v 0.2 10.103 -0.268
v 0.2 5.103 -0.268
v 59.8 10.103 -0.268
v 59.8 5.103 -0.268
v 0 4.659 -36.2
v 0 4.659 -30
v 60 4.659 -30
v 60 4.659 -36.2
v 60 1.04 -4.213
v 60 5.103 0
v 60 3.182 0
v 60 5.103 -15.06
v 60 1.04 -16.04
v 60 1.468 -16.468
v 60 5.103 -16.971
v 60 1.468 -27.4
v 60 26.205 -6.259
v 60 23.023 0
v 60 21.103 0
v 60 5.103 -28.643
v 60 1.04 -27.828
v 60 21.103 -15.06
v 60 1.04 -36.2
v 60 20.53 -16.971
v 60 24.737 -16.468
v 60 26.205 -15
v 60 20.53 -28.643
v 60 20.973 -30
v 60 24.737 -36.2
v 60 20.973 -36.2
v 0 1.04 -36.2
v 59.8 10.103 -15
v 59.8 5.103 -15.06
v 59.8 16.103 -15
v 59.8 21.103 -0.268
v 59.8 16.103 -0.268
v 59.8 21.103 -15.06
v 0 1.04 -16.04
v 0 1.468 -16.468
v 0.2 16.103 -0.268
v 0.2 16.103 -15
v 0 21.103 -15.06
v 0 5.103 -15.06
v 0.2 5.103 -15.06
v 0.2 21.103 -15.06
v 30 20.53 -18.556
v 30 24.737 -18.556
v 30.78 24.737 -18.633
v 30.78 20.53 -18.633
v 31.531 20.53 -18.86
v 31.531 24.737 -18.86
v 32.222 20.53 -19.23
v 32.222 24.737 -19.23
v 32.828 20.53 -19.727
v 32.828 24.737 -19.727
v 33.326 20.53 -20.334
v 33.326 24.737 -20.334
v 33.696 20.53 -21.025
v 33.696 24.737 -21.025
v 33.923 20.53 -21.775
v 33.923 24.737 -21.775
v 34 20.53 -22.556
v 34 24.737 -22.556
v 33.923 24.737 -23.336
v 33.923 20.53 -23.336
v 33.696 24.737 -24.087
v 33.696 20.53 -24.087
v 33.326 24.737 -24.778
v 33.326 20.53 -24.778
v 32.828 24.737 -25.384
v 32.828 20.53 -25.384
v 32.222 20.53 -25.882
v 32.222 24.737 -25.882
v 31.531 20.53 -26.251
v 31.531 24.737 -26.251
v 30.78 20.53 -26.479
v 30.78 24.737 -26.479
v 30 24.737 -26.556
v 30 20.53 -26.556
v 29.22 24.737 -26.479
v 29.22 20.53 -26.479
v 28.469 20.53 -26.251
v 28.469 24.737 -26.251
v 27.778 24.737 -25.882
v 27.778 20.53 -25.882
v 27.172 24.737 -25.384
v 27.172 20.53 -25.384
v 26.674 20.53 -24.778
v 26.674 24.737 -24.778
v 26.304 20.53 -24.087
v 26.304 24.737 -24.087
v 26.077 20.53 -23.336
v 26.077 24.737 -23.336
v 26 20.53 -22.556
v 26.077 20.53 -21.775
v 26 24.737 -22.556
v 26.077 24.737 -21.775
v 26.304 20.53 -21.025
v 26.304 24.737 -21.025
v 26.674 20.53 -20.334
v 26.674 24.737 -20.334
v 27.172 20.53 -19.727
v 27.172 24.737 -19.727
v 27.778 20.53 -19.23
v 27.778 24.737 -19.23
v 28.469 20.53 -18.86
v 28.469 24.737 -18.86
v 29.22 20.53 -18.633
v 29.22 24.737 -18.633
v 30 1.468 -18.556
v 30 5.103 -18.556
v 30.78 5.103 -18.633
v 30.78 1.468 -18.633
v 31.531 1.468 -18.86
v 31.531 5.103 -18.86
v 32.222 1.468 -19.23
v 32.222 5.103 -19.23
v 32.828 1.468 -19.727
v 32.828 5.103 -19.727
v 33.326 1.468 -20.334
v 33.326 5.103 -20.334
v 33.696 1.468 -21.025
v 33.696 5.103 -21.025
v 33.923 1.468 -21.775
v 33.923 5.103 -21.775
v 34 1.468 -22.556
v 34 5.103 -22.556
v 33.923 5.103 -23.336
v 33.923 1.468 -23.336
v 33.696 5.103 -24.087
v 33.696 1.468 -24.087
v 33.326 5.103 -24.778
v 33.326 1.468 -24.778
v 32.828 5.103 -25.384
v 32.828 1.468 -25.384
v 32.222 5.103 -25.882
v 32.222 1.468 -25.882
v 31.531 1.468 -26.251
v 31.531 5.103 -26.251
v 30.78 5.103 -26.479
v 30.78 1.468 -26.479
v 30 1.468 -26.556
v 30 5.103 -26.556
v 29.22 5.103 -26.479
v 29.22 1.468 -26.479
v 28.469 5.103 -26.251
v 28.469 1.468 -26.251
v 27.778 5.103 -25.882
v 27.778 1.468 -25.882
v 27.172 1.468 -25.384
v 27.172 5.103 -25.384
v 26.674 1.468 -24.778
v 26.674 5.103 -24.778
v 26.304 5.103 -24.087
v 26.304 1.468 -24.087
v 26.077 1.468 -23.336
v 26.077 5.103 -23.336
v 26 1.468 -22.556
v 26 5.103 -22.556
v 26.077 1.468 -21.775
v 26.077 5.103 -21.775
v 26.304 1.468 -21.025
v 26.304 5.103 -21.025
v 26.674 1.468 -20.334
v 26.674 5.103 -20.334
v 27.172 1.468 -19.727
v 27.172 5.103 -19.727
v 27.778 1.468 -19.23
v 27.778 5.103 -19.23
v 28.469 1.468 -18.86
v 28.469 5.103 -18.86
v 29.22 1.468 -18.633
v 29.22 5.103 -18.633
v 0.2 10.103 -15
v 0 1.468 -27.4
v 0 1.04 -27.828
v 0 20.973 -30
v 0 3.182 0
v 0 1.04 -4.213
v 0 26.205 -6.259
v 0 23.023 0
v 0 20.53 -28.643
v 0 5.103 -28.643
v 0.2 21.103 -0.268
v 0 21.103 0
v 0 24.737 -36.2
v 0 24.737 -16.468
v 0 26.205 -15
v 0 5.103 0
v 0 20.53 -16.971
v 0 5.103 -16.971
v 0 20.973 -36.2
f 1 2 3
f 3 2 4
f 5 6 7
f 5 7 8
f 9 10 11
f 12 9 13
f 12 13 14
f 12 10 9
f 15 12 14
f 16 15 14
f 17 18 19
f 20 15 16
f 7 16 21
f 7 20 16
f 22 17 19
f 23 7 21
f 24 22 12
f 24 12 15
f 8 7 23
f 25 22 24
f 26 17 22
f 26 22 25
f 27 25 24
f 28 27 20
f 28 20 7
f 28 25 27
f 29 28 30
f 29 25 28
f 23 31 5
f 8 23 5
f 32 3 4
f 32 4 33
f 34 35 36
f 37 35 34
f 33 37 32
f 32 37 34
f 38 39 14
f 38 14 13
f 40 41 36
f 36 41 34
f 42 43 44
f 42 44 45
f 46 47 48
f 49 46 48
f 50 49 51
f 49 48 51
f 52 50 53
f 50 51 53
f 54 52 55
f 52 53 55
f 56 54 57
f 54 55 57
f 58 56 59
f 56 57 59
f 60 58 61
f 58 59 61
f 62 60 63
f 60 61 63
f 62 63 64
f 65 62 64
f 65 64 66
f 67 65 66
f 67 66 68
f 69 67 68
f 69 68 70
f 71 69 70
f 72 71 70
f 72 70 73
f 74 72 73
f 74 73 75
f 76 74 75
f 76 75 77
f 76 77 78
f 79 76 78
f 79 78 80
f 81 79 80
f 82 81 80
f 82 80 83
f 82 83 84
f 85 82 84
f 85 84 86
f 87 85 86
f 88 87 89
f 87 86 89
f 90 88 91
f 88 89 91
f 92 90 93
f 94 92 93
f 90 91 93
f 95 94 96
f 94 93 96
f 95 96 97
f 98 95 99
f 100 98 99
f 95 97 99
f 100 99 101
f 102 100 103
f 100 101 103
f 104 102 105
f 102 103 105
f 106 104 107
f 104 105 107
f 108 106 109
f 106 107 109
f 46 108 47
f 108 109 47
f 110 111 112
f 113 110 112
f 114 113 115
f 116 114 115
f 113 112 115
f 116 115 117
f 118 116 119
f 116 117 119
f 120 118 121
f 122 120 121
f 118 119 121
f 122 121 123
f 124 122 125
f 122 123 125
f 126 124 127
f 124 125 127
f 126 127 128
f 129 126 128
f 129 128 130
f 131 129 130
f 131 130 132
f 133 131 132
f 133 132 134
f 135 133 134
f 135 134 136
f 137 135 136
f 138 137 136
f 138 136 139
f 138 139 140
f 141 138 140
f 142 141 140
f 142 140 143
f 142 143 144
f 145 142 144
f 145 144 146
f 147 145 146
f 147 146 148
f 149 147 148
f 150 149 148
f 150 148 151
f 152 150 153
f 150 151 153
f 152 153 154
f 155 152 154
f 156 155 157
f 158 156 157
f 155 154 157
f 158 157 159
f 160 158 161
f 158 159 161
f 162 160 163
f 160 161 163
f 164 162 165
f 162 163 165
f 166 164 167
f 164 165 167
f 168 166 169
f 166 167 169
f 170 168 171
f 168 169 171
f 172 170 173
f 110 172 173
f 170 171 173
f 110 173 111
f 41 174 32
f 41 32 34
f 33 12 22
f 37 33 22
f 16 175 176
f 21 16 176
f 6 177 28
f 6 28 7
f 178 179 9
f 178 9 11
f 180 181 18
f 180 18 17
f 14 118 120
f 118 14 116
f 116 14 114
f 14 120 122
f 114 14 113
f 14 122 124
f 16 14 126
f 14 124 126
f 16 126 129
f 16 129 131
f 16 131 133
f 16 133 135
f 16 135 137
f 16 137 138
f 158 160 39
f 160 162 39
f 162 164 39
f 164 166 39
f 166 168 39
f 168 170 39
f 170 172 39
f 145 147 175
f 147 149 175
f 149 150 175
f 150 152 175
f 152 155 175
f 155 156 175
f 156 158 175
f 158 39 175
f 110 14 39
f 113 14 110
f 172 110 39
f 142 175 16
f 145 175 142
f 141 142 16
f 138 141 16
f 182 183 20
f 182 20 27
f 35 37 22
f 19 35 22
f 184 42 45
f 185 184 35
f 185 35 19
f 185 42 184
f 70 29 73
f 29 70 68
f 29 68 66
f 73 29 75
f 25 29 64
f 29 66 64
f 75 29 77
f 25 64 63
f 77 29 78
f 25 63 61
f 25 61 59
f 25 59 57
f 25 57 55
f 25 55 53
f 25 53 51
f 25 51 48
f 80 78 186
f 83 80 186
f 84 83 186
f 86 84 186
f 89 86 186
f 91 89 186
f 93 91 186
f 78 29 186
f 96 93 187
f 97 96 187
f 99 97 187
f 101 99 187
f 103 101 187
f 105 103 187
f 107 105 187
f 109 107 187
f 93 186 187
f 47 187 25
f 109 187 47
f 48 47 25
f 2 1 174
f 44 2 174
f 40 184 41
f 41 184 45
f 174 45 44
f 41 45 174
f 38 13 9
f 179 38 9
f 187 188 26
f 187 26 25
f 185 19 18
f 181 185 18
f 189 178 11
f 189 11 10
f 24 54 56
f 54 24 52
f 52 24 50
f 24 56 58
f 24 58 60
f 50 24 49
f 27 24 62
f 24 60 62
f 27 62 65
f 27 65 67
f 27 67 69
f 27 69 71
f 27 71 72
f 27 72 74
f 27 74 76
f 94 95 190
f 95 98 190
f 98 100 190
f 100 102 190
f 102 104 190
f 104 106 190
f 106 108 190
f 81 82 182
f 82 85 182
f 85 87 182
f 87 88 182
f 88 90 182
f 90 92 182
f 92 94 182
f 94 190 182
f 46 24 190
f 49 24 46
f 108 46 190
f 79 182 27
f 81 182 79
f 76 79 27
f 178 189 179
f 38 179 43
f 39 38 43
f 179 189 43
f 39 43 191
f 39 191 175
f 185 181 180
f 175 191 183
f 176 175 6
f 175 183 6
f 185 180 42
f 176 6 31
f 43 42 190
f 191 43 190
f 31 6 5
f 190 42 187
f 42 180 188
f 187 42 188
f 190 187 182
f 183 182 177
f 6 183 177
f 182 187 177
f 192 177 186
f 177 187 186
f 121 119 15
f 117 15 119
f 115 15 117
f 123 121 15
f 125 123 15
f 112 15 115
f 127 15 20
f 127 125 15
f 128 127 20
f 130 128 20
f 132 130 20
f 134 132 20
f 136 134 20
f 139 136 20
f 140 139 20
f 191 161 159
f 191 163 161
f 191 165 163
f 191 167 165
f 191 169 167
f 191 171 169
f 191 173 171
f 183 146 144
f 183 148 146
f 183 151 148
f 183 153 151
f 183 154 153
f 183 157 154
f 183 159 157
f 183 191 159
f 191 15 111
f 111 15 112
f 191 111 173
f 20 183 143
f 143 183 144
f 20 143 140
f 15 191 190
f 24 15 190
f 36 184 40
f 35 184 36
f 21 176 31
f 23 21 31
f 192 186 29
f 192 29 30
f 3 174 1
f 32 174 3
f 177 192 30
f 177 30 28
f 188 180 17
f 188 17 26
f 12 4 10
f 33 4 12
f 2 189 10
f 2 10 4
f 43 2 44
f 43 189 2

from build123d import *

# Parameters (mm, degrees)
CROQUIS1_W              = 11.672108333
CROQUIS1_H              = 15.427149297
SALIENTE_EXTRUIR1_DEPTH = 60
CROQUIS2_R              = 4
CORTAR_EXTRUIR1_DEPTH   = 60
CROQUIS5_W              = 60
CROQUIS5_H              = 14.732368319
SALIENTE_EXTRUIR4_DEPTH = 5
CROQUIS6_W              = 14.792406449
CROQUIS6_H              = 16
CORTAR_EXTRUIR2_DEPTH   = 0.2
CORTAR_EXTRUIR3_DEPTH   = 60
SALIENTE_EXTRUIR5_DEPTH = 60


with BuildPart() as part:
    # Croquis1 → Saliente-Extruir1 (new body)
    with BuildSketch(Plane(origin=(0, 0, 0), x_dir=(0, 0, -1), z_dir=(1, 0, 0))):
        Polygon((0, 23.023275897), (6.259402679, 26.20509842), (15, 26.20509842), (16.468373545, 24.736724875), (30, 24.736724875), (36.2, 24.736724875), (36.2, 20.972943127), (30, 20.972943127), (30, 4.65930459), (36.2, 4.65930459), (36.2, 1.468373545), (30, 1.468373545), (16.468373545, 1.468373545), (15, 0), (6.259402679, 0), (0, 3.181822522), (0, 5.10254921), (15, 5.10254921), (15, 21.10254921), (0, 21.10254921), align=None)
        with Locations((22.807201834, 12.816123859)):
            Rectangle(CROQUIS1_W, CROQUIS1_H, mode=Mode.SUBTRACT)
    extrude(amount=SALIENTE_EXTRUIR1_DEPTH)

    # Croquis2 → Cortar-Extruir1 (cut)
    with BuildSketch(Plane(origin=(0, 24.736724875, 0), x_dir=(1, 0, 0), z_dir=(0, 1, 0))):
        with Locations(Location((30, 22.555814773, 0), (0, 0, 270))):
            Circle(CROQUIS2_R)
    extrude(amount=-CORTAR_EXTRUIR1_DEPTH, mode=Mode.SUBTRACT)

    # Croquis5 → Saliente-Extruir4 (add)
    with BuildSketch(Plane(origin=(0, 5.10254921, 0), x_dir=(1, 0, 0), z_dir=(0, 1, 0))):
        with Locations((30, 7.633815841)):
            Rectangle(CROQUIS5_W, CROQUIS5_H)
    saliente_extruir4 = extrude(amount=SALIENTE_EXTRUIR4_DEPTH)

    # Simetría1: Saliente-Extruir4 across plane
    add(saliente_extruir4.mirror(Plane.ZX.offset(13.10254921)))

    # Croquis6 → Cortar-Extruir2 (cut)
    with BuildSketch(Plane(origin=(60, 0, 0), x_dir=(0, 0, -1), z_dir=(1, 0, 0))):
        with Locations((7.663834905, 13.10254921)):
            Rectangle(CROQUIS6_W, CROQUIS6_H)
    cortar_extruir2 = extrude(amount=-CORTAR_EXTRUIR2_DEPTH, mode=Mode.SUBTRACT)

    # Simetría2: Cortar-Extruir2 across plane
    add(cortar_extruir2.mirror(Plane(origin=(30, 0, 0), x_dir=(0, 0, 1), z_dir=(1, 0, 0))), mode=Mode.SUBTRACT)

    # Croquis7 → Cortar-Extruir3 (cut)
    with BuildSketch(Plane(origin=(60, 0, 0), x_dir=(0, 0, -1), z_dir=(1, 0, 0))):
        Polygon((16.040272261, 1.040272261), (4.212939392, 1.040272261), (2.720078376, -1.896540894), (18.763264408, -1.896540894), align=None)
    extrude(amount=-CORTAR_EXTRUIR3_DEPTH, mode=Mode.SUBTRACT)

    # Croquis8 → Saliente-Extruir5 (add)
    with BuildSketch(Plane.ZY):
        Polygon((-27.827964964, 1.040272261), (-36.2, 1.040272261), (-36.2, 1.468373545), (-27.399863681, 1.468373545), align=None)
    extrude(amount=-SALIENTE_EXTRUIR5_DEPTH)


solid = part.part
